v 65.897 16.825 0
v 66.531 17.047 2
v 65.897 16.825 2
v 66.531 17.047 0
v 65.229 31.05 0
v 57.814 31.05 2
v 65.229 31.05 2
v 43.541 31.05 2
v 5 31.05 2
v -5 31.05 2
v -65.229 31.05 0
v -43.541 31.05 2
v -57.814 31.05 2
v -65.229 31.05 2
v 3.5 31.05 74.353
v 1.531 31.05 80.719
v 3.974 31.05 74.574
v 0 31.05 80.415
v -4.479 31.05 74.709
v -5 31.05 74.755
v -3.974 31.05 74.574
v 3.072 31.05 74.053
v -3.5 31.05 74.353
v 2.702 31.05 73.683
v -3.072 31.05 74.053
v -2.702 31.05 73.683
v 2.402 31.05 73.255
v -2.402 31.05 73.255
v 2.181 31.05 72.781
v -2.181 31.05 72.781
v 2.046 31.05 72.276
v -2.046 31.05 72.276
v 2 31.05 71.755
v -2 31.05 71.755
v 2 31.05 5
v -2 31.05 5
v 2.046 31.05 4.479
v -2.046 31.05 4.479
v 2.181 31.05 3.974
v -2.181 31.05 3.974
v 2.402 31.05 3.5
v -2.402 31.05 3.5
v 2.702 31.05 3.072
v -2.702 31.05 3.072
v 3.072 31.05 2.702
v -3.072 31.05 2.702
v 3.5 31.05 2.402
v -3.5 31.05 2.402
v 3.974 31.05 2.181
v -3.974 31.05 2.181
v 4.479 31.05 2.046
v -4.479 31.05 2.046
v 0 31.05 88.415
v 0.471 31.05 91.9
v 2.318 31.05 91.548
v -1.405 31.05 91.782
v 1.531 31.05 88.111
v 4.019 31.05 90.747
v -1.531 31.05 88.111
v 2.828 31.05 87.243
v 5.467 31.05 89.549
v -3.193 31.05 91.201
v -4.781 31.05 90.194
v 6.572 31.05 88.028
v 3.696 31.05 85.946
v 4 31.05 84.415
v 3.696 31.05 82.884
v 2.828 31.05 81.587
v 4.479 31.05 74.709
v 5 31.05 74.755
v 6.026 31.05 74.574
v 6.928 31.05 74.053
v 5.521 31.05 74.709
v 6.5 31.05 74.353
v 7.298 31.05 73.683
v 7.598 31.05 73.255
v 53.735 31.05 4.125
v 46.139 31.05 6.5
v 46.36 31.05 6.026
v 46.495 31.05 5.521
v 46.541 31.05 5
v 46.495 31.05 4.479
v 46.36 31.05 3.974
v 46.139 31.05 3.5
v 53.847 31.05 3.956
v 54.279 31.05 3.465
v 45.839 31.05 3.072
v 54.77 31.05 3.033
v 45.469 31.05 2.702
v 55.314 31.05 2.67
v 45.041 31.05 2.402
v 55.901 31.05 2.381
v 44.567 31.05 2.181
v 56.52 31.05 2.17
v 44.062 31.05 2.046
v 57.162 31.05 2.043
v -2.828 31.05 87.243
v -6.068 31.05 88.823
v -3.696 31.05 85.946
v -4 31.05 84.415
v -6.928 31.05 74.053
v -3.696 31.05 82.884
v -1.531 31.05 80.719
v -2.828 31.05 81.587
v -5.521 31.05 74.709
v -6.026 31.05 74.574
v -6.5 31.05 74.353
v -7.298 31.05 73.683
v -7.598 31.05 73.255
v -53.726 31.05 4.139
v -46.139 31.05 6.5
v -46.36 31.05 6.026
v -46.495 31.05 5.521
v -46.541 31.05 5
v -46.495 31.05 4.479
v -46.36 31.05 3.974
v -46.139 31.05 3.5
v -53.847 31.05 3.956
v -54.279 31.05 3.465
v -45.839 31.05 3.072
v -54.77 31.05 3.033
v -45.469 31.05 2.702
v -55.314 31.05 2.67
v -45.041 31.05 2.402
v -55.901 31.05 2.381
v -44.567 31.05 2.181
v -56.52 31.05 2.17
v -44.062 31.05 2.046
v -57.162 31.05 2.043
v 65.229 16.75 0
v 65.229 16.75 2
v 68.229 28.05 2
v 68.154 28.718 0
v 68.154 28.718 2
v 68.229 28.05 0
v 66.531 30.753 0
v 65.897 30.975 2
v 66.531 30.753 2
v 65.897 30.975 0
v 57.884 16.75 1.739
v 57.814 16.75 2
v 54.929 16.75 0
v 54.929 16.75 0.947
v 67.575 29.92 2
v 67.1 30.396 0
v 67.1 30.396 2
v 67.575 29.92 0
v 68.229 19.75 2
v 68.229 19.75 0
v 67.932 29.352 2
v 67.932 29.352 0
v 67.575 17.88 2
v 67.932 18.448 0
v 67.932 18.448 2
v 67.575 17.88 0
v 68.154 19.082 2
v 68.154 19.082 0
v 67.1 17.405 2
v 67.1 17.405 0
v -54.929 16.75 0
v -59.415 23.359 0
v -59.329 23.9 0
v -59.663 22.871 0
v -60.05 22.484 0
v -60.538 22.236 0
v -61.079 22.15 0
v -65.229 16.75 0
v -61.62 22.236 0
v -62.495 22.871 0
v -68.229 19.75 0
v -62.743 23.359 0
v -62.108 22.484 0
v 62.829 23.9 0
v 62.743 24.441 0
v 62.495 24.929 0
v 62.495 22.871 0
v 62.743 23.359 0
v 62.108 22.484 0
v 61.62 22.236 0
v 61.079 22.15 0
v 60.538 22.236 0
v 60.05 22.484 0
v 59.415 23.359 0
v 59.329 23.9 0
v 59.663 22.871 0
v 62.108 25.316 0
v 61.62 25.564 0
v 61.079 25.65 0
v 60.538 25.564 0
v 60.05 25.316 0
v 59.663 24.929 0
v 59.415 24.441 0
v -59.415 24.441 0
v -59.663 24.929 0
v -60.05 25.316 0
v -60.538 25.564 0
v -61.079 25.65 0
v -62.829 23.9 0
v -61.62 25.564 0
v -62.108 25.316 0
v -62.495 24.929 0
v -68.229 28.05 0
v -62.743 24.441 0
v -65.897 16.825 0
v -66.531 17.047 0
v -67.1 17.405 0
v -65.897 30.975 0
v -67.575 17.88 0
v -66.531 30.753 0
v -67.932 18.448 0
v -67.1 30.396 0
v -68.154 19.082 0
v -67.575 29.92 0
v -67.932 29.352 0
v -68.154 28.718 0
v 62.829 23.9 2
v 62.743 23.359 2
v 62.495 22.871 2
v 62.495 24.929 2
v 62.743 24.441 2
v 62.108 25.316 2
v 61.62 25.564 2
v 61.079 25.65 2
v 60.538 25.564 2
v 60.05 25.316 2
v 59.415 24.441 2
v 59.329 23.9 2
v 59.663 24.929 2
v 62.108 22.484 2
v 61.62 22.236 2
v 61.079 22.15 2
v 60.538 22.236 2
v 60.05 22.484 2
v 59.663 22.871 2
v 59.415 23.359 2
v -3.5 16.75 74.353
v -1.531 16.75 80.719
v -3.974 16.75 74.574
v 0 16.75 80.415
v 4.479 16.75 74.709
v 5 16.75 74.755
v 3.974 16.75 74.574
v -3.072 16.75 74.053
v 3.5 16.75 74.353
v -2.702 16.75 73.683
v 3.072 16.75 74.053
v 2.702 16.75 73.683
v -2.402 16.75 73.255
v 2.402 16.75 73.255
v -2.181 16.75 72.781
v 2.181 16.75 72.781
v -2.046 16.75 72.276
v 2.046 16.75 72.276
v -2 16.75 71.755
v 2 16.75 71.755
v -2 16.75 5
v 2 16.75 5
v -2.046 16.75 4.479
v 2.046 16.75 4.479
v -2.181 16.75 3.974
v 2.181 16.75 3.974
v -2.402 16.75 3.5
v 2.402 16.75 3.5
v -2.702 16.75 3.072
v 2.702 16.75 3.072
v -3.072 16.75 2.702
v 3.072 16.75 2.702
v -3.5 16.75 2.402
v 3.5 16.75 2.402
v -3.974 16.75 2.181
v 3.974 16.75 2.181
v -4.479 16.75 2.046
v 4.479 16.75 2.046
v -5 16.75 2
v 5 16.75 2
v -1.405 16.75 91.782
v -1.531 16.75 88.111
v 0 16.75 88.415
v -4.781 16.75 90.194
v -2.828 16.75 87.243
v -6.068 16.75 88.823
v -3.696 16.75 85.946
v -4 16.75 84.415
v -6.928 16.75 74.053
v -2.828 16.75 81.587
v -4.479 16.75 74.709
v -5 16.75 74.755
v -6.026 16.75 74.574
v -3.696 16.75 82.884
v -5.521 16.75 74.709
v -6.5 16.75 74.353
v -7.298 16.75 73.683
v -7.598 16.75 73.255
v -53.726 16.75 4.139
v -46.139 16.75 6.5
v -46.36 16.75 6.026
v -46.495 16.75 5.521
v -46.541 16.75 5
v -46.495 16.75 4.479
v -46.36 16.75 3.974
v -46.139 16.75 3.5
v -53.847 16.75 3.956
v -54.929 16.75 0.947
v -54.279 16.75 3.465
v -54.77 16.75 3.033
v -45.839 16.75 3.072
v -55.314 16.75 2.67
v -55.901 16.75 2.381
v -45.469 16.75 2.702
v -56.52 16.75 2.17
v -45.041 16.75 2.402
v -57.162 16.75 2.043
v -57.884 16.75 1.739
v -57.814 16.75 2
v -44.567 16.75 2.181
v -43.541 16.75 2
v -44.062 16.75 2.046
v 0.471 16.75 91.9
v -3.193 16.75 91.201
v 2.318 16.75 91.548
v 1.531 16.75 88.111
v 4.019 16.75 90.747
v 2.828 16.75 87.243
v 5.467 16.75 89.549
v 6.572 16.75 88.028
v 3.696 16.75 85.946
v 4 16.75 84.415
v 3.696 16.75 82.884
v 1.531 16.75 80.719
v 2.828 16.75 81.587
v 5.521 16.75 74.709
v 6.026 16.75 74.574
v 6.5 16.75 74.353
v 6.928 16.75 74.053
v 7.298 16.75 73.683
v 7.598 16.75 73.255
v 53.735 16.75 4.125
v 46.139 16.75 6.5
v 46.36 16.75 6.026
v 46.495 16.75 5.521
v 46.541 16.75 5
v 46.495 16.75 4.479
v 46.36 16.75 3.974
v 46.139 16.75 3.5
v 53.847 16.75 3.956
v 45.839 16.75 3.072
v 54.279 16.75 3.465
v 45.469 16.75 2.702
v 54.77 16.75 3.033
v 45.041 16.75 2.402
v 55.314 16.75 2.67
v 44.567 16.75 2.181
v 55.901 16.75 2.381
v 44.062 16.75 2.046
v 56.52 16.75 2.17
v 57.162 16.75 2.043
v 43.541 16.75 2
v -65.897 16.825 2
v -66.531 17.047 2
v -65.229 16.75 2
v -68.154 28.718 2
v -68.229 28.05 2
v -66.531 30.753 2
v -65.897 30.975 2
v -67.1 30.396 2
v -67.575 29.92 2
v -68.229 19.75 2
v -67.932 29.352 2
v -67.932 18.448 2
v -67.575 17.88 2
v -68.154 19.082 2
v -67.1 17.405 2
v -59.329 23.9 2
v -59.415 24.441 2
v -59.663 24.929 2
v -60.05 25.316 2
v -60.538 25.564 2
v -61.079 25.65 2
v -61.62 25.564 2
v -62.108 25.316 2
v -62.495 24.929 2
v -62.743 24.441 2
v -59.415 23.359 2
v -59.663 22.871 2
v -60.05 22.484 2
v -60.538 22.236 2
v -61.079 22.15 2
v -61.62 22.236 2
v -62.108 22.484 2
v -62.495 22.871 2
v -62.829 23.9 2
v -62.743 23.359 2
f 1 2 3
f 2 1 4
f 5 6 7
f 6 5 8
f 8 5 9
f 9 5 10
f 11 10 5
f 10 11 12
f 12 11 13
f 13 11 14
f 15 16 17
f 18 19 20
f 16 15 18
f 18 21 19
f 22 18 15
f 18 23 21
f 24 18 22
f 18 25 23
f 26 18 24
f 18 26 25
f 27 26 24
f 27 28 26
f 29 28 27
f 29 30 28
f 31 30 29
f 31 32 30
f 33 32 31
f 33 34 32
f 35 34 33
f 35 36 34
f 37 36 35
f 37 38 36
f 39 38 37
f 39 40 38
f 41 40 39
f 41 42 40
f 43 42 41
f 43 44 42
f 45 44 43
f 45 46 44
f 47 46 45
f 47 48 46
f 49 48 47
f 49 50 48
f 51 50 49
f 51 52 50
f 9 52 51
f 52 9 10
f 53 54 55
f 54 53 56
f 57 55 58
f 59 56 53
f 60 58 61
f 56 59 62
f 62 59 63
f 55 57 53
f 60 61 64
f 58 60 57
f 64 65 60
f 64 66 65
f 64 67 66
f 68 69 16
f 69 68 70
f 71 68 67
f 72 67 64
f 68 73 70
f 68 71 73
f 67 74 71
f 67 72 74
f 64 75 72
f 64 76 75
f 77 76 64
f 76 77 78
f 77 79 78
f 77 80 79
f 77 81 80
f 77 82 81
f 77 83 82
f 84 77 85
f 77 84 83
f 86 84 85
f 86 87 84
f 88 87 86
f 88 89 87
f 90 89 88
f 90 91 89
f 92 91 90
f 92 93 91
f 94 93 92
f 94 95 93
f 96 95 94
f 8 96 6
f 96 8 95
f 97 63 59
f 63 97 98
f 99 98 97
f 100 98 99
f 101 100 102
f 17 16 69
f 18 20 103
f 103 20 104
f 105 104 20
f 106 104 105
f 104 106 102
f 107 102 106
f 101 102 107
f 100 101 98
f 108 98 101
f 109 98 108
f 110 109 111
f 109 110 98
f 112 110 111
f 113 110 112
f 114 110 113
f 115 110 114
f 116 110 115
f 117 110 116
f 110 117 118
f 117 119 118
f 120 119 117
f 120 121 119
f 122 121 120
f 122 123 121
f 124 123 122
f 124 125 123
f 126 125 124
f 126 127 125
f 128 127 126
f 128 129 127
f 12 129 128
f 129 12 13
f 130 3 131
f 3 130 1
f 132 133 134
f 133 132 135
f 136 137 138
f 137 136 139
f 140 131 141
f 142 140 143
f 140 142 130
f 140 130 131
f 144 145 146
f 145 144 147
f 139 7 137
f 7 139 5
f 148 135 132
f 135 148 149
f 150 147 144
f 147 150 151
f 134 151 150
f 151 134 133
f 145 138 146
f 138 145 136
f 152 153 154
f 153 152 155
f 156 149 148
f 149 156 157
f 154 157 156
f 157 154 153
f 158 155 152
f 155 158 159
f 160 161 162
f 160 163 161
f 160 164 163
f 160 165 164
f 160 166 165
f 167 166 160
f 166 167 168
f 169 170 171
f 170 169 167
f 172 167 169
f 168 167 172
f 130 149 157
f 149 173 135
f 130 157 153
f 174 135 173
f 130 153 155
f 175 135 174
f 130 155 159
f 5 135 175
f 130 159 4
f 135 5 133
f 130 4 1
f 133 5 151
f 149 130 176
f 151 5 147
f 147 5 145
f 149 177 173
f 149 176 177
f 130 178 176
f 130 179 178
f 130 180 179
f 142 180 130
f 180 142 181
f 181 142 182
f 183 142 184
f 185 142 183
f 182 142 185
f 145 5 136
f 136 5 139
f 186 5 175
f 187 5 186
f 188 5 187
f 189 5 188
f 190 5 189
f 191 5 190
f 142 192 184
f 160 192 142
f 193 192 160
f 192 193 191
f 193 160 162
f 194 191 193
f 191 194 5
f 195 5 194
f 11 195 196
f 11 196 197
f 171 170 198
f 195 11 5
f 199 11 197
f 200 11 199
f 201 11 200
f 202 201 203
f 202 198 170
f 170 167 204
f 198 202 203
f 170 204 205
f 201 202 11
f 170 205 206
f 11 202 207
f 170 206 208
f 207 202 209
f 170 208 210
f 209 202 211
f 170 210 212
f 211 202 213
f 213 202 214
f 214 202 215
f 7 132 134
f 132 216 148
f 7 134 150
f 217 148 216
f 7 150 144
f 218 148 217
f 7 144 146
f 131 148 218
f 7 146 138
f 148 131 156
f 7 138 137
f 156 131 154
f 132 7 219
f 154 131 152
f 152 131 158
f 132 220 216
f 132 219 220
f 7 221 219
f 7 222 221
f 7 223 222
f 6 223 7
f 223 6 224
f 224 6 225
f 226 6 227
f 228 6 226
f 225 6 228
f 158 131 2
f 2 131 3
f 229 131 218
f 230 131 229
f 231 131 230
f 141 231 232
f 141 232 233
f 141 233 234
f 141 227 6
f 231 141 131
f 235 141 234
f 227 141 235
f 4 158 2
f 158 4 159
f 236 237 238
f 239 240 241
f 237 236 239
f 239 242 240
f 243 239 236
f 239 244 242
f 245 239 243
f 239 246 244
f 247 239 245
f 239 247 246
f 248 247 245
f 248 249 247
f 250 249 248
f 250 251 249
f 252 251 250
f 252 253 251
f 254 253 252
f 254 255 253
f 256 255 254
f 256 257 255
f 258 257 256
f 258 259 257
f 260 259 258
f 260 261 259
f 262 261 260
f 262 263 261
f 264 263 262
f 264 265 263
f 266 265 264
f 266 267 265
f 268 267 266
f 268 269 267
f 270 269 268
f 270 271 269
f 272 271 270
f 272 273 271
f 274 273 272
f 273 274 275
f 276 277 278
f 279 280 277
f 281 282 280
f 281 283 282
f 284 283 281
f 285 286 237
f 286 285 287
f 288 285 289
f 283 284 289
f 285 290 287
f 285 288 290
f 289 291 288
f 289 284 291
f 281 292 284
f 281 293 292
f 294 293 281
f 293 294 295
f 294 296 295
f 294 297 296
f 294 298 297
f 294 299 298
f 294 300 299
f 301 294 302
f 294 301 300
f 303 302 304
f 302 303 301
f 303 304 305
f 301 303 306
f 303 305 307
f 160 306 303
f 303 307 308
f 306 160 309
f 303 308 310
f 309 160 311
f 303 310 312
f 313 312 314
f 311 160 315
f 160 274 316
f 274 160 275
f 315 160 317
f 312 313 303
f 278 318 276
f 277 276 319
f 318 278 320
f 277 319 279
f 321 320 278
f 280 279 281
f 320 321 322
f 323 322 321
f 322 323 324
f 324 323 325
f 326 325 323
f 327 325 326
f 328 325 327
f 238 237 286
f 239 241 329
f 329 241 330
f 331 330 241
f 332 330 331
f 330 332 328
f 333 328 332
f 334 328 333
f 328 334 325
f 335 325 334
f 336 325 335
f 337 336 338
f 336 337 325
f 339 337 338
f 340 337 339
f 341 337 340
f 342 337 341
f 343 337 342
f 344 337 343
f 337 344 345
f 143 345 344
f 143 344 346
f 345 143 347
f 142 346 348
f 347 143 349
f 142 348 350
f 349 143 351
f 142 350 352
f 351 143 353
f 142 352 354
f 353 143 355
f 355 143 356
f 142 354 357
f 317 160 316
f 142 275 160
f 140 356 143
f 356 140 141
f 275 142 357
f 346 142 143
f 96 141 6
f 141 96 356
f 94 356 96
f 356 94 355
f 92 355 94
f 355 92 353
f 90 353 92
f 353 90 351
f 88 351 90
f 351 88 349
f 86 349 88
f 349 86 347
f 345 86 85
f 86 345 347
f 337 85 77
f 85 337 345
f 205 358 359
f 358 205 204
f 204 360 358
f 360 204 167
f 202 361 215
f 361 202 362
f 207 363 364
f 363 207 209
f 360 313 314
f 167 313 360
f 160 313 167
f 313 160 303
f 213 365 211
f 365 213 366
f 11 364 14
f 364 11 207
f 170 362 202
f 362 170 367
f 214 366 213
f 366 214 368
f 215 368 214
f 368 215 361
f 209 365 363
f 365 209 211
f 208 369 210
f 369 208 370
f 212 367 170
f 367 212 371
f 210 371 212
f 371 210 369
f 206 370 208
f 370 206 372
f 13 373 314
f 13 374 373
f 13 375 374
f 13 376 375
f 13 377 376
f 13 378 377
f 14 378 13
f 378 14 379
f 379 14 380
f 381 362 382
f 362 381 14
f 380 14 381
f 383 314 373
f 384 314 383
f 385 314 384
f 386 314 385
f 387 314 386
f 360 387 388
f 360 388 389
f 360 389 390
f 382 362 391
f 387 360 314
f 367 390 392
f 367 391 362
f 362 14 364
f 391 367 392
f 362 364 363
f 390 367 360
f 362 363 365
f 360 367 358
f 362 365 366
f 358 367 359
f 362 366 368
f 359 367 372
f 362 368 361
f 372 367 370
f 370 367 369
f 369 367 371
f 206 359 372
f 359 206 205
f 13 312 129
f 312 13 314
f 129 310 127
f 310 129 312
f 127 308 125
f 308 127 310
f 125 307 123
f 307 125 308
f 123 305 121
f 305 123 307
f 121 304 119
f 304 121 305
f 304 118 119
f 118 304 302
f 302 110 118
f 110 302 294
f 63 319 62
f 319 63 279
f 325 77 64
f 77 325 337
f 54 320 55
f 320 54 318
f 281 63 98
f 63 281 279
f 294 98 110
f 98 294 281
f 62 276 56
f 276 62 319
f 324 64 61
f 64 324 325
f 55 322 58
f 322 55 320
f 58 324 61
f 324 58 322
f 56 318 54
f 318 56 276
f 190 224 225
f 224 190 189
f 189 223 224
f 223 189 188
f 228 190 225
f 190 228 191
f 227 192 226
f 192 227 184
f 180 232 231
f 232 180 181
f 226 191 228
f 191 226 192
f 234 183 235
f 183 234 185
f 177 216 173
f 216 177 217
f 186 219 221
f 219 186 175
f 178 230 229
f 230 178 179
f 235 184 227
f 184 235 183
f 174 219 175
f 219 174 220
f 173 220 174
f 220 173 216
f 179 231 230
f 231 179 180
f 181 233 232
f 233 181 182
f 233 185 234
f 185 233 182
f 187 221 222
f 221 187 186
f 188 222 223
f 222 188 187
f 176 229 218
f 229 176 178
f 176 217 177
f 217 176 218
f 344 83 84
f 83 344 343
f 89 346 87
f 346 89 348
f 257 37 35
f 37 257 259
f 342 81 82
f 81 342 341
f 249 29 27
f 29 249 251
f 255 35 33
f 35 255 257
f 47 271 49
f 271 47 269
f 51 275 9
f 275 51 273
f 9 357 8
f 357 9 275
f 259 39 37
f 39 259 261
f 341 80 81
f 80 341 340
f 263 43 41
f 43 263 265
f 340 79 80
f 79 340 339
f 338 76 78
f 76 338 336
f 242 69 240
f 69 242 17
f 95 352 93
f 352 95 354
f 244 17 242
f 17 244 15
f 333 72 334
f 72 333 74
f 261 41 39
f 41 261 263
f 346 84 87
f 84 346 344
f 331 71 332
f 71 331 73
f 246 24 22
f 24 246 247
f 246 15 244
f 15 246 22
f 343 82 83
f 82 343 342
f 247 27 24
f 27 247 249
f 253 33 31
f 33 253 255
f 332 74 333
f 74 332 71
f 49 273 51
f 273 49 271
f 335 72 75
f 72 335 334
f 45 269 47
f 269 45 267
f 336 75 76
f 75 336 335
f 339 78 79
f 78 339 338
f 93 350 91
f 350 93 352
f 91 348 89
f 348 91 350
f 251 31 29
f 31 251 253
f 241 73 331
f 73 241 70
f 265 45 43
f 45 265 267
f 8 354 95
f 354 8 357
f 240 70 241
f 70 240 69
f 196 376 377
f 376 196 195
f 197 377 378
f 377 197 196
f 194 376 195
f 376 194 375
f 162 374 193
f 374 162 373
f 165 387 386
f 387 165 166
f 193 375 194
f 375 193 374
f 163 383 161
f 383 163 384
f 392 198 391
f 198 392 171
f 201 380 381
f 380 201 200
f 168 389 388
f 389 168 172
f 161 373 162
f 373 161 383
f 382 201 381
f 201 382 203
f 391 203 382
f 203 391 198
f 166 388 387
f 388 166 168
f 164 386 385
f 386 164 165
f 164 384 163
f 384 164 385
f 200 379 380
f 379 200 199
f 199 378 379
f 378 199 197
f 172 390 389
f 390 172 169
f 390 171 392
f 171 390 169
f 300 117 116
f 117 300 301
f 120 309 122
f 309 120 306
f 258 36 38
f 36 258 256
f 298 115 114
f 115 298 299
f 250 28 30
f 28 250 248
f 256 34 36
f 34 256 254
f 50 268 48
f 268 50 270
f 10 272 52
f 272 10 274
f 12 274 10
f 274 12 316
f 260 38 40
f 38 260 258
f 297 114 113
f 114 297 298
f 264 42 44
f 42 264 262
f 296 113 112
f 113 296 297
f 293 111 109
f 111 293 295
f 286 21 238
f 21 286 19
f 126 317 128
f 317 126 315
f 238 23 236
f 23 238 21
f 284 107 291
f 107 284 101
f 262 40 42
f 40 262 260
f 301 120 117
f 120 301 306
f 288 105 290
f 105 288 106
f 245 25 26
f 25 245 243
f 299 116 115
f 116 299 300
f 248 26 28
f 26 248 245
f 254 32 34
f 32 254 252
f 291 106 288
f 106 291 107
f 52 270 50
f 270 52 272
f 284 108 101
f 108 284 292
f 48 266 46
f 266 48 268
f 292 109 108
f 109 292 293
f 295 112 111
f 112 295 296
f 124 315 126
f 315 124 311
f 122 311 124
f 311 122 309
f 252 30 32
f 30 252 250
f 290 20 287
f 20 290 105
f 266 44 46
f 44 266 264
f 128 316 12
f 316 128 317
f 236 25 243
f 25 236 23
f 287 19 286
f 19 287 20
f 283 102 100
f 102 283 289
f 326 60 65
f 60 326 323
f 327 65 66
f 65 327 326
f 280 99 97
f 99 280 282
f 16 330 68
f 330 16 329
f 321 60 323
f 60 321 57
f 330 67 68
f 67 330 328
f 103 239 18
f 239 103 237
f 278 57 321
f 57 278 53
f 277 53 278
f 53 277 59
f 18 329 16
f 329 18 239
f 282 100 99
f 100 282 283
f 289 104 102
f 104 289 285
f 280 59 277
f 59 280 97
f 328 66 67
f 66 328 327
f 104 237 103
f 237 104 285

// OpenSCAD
// file: parameters.scad
// Parameters shared between modules
Base_th = 2;
Beam_width = 15;
Wiggle = 0.25;
Fat_beam_width = Beam_width + Wiggle;
Beam_length = 400;
Wall_th = 2.5;
Min_beam_width = 12.5;
Max_beam_width = 17.5;
Zip_th = 2;
Zip_h = Zip_th + Max_beam_width - Min_beam_width;
Zip_w = 5.0;
Nema17_cube_width          = 42.43;
Nema17_screw_hole_width    = 43.74; // Opposite corner screws
Nema17_ring_diameter       = 22;
Nema17_cube_height         = 39.36;
Nema17_shaft_height        = 63.65;
Nema17_ring_height         = 2;
Nema17_shaft_radius        = 5/2;
b608_outer_dia = 22.2;
b608_width = 7.05;
b608_bore_r = 4;
Gap_between_sandwich_and_plate = 1.5 + Base_th; // 1.5 mm for wiggle
Motor_bracket_flerp_r = 6;
Motor_bracket_flerp = 14;
Motor_bracket_cw = Nema17_cube_width + 6;
Motor_bracket_att_ang = 50;
Mounting_screw_d = 3.5;
Mounting_screw_head_d = 14;
Spool_outer_wall_th = 4;

// Corner clamp parameters
Cc_l1 = (Fat_beam_width+2*Wall_th)*2*sqrt(3);
Cc_rad_b = 4;
Cc_action_point_from_mid = Cc_l1/sqrt(3)-2*Cc_rad_b-7;
Cc_plastic_length = sqrt(Cc_action_point_from_mid*Cc_action_point_from_mid
                       - (Cc_action_point_from_mid/2)*(Cc_action_point_from_mid/2));
Eyelet_extra_dist = 0.75;
Eyelet_diameter = 4.30;
Move_d_bearings_inwards = -2;

// The distance between the two action points on the mover
Sidelength = Beam_length + 2*Cc_plastic_length;

/////// Gear parameters ////////////
Circular_pitch = 262;
Motor_teeth = 10;
Gear_height = 21.4-3;
Motor_pitch                      = (Motor_teeth*Circular_pitch/360);
Motor_pitch_diametrial           = Motor_teeth/(2*Motor_pitch);
Motor_outer_radius               = Motor_pitch + 1/Motor_pitch_diametrial;
Spool_teeth = 100;
Spool_r = 75;
Spool_height = 8;
Spool_pitch                      = (Spool_teeth*Circular_pitch/360);
Spool_pitch_diametrial           = Spool_teeth/(2*Spool_pitch);
Spool_outer_radius               = Spool_pitch + 1/Spool_pitch_diametrial;
Sep_disc_radius = 161.83/2; // Made to match 255 teeth gt2 pulley
Motor_bracket_depth = Gear_height+1+7+Nema17_ring_height+1+Gap_between_sandwich_and_plate;
Spool_core_flerp0 = 16+3;

/////// Lineroller parameters ////////////
b623_width  = 4;
b623_bore_r = 3/2;
b623_vgroove_big_r = 12/2;
b623_vgroove_small_r = 10/2;
b623_outer_dia = 10;
b623_vgroove_room_to_grow_r = 1.1;
b623_flange_dia = 11.5;
b623_flange_room_to_grow_r = 0.5;

Depth_of_roller_base = 18;
Roller_flerp = 6;
Roller_l = 42;
Roller_fl = (Roller_l - Depth_of_roller_base)/2;

Line_roller_wall_th = 5;

Line_roller_ABC_winch_h =  Gap_between_sandwich_and_plate
                           + Sep_disc_radius
                           - Spool_r
                           + Depth_of_roller_base/2
                           + b623_vgroove_small_r;


Ptfe_r = 2.1;
Roller_base_r = 8;
Screw_h = 2;
Screw_head_h = 2;
M3_screw_head_d = 5.8;
Spool_center_bearing_wall_th = 5;
Corner_clamp_bearings_center_to_center = max(15, (b623_vgroove_big_r + b623_vgroove_room_to_grow_r)*2);
Anchor_bearings_center_to_center = Corner_clamp_bearings_center_to_center + b623_outer_dia;

//// Lineroller anchor parameters /////

Back_bearing_x = b623_vgroove_big_r + 1.5;
Front_bearing_x = -b623_vgroove_big_r - 5;
Move_tower = -12.2;
Lower_bearing_z = 13;
Higher_bearing_z = Lower_bearing_z + Corner_clamp_bearings_center_to_center;

//// Cable Clamp parameters /////
Bit_width = 12;
Cable_r=2.5;

// Belt drive parameters
GT2_belt_width = 6.5;
GT2_gear_height = GT2_belt_width + 2;
GT2_motor_gear_height = 16;
GT2_motor_gear_outer_dia = 16;
GT2_spool_gear_teeth = 255;
GT2_motor_gear_teeth = 20;
Torx_depth = GT2_gear_height/2;
Belt_roller_h = 56;
Belt_thickness = 1.4;

Belt_roller_space_between_walls = 2*b623_width + 0.8;
Belt_roller_wall_th = (Depth_of_roller_base - Belt_roller_space_between_walls)/2+2;
Belt_roller_top_adj_screw_x = Depth_of_roller_base/2-3.7;
Belt_roller_top_adj_screw_y = Belt_roller_space_between_walls/2+2;
Belt_roller_containing_cube_ywidth = Belt_roller_space_between_walls+8.5;
Belt_roller_containing_cube_xwidth = 14;
Belt_roller_insert_h = 18;

Sandwich_ABC_width = 2*(1+Spool_height) + GT2_gear_height;
Sandwich_D_width = 3*(1+Spool_height) + GT2_gear_height;
Spool_core_halve_width = 14.3;
Spool_core_impression_in_spool_cover = 0;
Spool_cover_bottom_th = 1.5;
Spool_cover_shoulder = 2;
Spool_core_cover_adj = Spool_cover_shoulder+Spool_cover_bottom_th-Spool_core_impression_in_spool_cover;
Spool_core_tot_length = 136.458;
Spool_cover_outer_r = Sep_disc_radius + 2;

Smooth_rod_length_ABC = Sandwich_ABC_width + 2*(Spool_core_halve_width-Spool_core_impression_in_spool_cover + Spool_cover_bottom_th + Spool_cover_shoulder);
Smooth_rod_length_D = Sandwich_D_width + 2*(Spool_core_halve_width-Spool_core_impression_in_spool_cover + Spool_cover_bottom_th + Spool_cover_shoulder);
echo("Smooth_rod_length_ABC", Smooth_rod_length_ABC);
echo("Smooth_rod_length_D", Smooth_rod_length_D);

Spool_cover_tot_height = Spool_cover_bottom_th+Spool_cover_shoulder+1+Spool_height;
Spool_cover_D_left_tot_height = Spool_cover_shoulder+Spool_cover_bottom_th+1+Spool_height+1+Spool_height;

spd = Spool_height+GT2_gear_height;
// Horizontal_deflector_cube_y_size must be exact this number
// because we want to deflect AB-lines
// 60 degrees on the ceiling unit, and we want to put two
// deflectors in a row and get a distance between bearings
// that maintain the distance d when deflecting 60 degrees
Horizontal_deflector_cube_y_size = (2/sqrt(3))*spd;

Belt_roller_bearing_xpos = Sep_disc_radius + b623_outer_dia/2+Belt_thickness;


// Top plate parameters needed for layout slicer
Yshift_top_plate = -297.8;
// main file
include <parameters.scad>
use <util.scad>

bearing_z = Sep_disc_radius+Gap_between_sandwich_and_plate;

//placed_sandwich_ABC();
module placed_sandwich_ABC(){
  translate([0,
             1 + Spool_height + GT2_gear_height/2,
             bearing_z])
    rotate([90,0,0]){
      sandwich_ABC();
      b608();
      translate([0,0,1+Spool_height+GT2_gear_height+Spool_height+1-b608_width])
        b608();
    }
}

//spool_core_halve();
//%rotate([90,0,0])
//import("../stl/spool_core.stl");
//rotate([-90,0,0])
spool_core_halve(false, Sandwich_ABC_width+2*Spool_core_cover_adj);
module spool_core_halve(twod = false, between){
  w = Spool_core_halve_width; // Width
  foot_r = 3;

  module bit(){
    rotate([0,0,90])
      translate([-w/2, -w/2, 0])
        left_rounded_cube2([w+4, w, Base_th], foot_r, $fn=28);
  }

  teeth=16;
  cubex = 2*bearing_z/sqrt(3)+sqrt(3)*w/2;
  if(!twod){
    difference(){
      union(){
        hull(){
          translate([0, between/2, bearing_z])
            rotate([-90,0,0])
            cylinder(d=15, h=w, $fn=25);
          translate([-cubex/2, between/2, 0])
            cube([cubex, w, Base_th]);
        }
        for(k=[0,1])
          mirror([k,0,0]){
            translate([cubex/2 + w/2 - 1, between/2 + w/2, 0])
              rotate([0,0,90])
                bit();
            translate([cubex/2 - 0.53, w + between/2, Base_th - 0.915])
              rotate([90,0,0])
                rotate([0,0,15])
                  inner_round_corner(r=5, h=w, ang=60, $fn=12*4);
          }
      }
      translate([0,0,bearing_z])
        rotate([90,0,0])
          cylinder(d=8.0, h=100, center=true, $fn=teeth);
      for(k=[0,1])
        mirror([k,0,0]){
          translate([2,w+1 + between/2 - 0.5,Base_th])
            rotate([90,0,0])
              rounded_spectri(2*bearing_z/sqrt(3)-4, w+1, 3, $fn=12*3);
          translate([cubex/2 + w/2 - 1, between/2 + w/2, 0.6])
            rotate([0,0,90])
              Mounting_screw();
        }
    }
  } else {
    difference(){
      translate([-Spool_core_tot_length/2, between/2])
        rounded_cube2_2d([Spool_core_tot_length, w], foot_r, $fn=28);
      for(k=[0,1])
        mirror([k,0])
          translate([-cubex/2 - w/2 + 1, between/2 + w/2])
            Mounting_screw(twod=true);
    }
  }
}

//!spool_cores(false, Sandwich_ABC_width + 2*Spool_core_cover_adj);
//spool_cores(true, Sandwich_ABC_width);
module spool_cores(twod=false, between){
  for(k=[0,1])
    mirror([0,k,0])
      spool_core_halve(twod, between);
}

// For printing
//spool_core();
module spool_core(){
  rotate([-90,0,0])
    spool_core_halve(false, Sandwich_ABC_width);
}
